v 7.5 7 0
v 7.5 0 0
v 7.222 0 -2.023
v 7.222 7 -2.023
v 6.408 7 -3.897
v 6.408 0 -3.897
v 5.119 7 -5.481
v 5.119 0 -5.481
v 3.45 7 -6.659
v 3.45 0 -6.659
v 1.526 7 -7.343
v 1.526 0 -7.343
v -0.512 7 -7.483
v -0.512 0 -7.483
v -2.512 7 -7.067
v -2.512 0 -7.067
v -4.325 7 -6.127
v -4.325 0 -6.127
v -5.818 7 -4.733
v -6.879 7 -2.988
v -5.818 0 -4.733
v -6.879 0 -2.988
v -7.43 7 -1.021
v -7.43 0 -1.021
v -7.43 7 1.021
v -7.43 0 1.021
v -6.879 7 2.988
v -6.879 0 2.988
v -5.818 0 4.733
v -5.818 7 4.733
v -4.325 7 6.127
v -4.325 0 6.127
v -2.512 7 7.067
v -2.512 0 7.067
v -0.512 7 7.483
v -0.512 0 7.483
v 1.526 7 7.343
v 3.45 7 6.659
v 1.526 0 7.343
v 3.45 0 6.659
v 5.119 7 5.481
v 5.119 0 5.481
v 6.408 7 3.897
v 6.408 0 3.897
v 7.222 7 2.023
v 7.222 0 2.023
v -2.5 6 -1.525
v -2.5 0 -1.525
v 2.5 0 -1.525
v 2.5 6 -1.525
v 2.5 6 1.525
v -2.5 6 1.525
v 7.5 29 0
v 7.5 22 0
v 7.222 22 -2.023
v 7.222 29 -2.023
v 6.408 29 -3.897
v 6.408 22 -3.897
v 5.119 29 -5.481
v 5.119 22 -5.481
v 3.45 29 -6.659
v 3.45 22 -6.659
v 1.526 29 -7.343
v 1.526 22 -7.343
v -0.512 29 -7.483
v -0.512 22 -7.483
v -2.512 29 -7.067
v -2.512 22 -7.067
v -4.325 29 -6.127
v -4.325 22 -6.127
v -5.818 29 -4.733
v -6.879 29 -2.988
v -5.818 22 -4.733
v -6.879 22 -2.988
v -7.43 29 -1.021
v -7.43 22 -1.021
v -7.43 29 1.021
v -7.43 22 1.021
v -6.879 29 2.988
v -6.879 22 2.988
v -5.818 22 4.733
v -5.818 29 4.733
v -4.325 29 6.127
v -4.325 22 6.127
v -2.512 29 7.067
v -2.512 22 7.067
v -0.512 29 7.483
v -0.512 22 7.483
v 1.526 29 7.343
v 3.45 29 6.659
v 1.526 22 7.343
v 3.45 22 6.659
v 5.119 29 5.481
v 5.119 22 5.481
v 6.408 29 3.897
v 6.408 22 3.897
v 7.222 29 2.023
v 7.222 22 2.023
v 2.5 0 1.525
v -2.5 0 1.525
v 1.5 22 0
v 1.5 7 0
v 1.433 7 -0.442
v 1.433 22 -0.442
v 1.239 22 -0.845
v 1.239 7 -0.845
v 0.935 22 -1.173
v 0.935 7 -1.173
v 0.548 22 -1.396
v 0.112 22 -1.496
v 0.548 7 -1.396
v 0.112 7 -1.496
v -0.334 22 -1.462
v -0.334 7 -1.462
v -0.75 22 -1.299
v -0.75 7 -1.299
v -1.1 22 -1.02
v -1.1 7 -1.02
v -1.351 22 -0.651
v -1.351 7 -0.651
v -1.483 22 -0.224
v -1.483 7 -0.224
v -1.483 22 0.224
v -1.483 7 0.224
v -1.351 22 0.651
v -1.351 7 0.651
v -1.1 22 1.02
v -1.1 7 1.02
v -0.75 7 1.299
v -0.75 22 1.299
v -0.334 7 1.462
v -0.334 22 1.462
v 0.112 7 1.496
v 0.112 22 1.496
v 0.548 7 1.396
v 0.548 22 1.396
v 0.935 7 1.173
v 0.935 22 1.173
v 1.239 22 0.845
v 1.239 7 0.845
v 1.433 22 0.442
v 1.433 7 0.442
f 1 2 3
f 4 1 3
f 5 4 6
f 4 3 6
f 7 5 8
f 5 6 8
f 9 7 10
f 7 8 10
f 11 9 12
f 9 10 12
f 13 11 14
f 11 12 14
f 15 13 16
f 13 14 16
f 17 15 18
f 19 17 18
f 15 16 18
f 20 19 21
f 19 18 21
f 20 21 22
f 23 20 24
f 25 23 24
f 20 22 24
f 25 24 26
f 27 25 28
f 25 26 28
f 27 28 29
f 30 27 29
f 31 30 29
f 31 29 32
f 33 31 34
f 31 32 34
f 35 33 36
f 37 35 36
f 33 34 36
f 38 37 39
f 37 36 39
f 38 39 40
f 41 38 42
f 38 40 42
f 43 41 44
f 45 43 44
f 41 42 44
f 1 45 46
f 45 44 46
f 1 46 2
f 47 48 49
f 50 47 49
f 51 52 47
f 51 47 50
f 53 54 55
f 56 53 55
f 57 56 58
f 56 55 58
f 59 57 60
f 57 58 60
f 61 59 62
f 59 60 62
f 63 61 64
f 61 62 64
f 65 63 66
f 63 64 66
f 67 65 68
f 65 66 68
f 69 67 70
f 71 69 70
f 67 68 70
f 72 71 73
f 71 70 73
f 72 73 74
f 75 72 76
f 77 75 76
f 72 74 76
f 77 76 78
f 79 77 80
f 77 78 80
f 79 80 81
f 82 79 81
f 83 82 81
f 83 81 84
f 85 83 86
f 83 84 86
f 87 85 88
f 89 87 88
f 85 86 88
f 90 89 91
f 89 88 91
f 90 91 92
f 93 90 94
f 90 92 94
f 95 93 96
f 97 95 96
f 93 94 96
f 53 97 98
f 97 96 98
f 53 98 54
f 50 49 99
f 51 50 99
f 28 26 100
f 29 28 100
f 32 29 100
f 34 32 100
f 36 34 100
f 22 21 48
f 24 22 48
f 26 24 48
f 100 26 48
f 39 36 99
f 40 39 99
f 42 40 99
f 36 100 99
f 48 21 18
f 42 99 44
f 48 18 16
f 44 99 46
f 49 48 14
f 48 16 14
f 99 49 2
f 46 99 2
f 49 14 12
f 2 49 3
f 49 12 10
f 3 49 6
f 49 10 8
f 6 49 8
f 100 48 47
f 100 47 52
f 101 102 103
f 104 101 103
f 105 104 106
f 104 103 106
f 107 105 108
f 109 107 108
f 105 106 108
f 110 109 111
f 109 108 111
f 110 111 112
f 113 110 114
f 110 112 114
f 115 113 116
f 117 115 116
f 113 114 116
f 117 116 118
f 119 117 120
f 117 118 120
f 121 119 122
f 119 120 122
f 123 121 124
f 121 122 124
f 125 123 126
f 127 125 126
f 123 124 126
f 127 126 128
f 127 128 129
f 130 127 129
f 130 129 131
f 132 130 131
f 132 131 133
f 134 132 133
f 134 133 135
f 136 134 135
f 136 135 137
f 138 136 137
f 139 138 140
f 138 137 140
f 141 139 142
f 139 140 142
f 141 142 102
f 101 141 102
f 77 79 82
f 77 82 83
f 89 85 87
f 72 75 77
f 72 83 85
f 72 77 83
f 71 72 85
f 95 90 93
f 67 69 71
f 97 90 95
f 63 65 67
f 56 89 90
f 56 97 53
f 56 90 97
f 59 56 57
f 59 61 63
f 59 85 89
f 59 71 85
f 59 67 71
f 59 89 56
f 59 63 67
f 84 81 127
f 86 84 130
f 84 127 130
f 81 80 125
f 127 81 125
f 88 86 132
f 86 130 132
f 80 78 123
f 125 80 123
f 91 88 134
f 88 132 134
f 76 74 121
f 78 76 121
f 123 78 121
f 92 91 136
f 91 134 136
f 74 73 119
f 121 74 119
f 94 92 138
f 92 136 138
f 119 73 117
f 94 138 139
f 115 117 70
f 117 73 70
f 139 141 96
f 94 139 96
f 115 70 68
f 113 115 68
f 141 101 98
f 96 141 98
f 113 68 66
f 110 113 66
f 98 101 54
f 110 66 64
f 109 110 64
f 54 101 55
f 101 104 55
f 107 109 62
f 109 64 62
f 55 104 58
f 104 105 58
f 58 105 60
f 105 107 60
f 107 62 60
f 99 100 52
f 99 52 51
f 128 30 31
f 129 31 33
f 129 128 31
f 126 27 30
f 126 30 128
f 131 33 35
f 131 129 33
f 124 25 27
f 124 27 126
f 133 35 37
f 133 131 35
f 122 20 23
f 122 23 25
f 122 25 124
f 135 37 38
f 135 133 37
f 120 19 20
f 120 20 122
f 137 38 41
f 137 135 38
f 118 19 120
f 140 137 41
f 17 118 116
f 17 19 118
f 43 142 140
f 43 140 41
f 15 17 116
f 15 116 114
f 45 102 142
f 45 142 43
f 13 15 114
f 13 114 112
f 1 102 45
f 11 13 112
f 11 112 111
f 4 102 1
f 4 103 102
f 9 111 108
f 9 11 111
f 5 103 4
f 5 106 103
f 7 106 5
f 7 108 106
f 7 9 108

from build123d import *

# Parameters (mm, degrees)
SKETCH1_R           = 7.5
BOSS_EXTRUDE1_DEPTH = 7
SKETCH2_R           = 1.5
BOSS_EXTRUDE2_DEPTH = 15
SKETCH3_W           = 5
SKETCH3_H           = 3.05
CUT_EXTRUDE1_DEPTH  = 6
SKETCH4_R           = 7.5
BOSS_EXTRUDE3_DEPTH = 7


with BuildPart() as part:
    # Sketch1 → Boss-Extrude1 (new body)
    with BuildSketch(Plane(origin=(0, 0, 0), x_dir=(1, 0, 0), z_dir=(0, 1, 0))):
        Circle(SKETCH1_R)
    extrude(amount=BOSS_EXTRUDE1_DEPTH)

    # Sketch2 → Boss-Extrude2 (add)
    with BuildSketch(Plane(origin=(0, 7, 0), x_dir=(1, 0, 0), z_dir=(0, 1, 0))):
        Circle(SKETCH2_R)
    extrude(amount=BOSS_EXTRUDE2_DEPTH)

    # Sketch3 → Cut-Extrude1 (cut)
    with BuildSketch(Plane.XZ):
        Rectangle(SKETCH3_W, SKETCH3_H)
    extrude(amount=-CUT_EXTRUDE1_DEPTH, mode=Mode.SUBTRACT)

    # Sketch4 → Boss-Extrude3 (add)
    with BuildSketch(Plane(origin=(0, 22, 0), x_dir=(1, 0, 0), z_dir=(0, 1, 0))):
        Circle(SKETCH4_R)
    extrude(amount=BOSS_EXTRUDE3_DEPTH)


solid = part.part
